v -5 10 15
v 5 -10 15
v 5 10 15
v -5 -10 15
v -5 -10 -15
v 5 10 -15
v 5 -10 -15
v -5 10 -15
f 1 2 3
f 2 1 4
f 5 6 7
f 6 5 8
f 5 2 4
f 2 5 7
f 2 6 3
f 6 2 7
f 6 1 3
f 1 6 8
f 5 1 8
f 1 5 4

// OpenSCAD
// See http://en.wikibooks.org/wiki/OpenSCAD_User_Manual/The_OpenSCAD_Language#Assign_Statement

assign (x = 10, y = 20, z = 30)
{
	cube([x, y, z], center = true);
}
